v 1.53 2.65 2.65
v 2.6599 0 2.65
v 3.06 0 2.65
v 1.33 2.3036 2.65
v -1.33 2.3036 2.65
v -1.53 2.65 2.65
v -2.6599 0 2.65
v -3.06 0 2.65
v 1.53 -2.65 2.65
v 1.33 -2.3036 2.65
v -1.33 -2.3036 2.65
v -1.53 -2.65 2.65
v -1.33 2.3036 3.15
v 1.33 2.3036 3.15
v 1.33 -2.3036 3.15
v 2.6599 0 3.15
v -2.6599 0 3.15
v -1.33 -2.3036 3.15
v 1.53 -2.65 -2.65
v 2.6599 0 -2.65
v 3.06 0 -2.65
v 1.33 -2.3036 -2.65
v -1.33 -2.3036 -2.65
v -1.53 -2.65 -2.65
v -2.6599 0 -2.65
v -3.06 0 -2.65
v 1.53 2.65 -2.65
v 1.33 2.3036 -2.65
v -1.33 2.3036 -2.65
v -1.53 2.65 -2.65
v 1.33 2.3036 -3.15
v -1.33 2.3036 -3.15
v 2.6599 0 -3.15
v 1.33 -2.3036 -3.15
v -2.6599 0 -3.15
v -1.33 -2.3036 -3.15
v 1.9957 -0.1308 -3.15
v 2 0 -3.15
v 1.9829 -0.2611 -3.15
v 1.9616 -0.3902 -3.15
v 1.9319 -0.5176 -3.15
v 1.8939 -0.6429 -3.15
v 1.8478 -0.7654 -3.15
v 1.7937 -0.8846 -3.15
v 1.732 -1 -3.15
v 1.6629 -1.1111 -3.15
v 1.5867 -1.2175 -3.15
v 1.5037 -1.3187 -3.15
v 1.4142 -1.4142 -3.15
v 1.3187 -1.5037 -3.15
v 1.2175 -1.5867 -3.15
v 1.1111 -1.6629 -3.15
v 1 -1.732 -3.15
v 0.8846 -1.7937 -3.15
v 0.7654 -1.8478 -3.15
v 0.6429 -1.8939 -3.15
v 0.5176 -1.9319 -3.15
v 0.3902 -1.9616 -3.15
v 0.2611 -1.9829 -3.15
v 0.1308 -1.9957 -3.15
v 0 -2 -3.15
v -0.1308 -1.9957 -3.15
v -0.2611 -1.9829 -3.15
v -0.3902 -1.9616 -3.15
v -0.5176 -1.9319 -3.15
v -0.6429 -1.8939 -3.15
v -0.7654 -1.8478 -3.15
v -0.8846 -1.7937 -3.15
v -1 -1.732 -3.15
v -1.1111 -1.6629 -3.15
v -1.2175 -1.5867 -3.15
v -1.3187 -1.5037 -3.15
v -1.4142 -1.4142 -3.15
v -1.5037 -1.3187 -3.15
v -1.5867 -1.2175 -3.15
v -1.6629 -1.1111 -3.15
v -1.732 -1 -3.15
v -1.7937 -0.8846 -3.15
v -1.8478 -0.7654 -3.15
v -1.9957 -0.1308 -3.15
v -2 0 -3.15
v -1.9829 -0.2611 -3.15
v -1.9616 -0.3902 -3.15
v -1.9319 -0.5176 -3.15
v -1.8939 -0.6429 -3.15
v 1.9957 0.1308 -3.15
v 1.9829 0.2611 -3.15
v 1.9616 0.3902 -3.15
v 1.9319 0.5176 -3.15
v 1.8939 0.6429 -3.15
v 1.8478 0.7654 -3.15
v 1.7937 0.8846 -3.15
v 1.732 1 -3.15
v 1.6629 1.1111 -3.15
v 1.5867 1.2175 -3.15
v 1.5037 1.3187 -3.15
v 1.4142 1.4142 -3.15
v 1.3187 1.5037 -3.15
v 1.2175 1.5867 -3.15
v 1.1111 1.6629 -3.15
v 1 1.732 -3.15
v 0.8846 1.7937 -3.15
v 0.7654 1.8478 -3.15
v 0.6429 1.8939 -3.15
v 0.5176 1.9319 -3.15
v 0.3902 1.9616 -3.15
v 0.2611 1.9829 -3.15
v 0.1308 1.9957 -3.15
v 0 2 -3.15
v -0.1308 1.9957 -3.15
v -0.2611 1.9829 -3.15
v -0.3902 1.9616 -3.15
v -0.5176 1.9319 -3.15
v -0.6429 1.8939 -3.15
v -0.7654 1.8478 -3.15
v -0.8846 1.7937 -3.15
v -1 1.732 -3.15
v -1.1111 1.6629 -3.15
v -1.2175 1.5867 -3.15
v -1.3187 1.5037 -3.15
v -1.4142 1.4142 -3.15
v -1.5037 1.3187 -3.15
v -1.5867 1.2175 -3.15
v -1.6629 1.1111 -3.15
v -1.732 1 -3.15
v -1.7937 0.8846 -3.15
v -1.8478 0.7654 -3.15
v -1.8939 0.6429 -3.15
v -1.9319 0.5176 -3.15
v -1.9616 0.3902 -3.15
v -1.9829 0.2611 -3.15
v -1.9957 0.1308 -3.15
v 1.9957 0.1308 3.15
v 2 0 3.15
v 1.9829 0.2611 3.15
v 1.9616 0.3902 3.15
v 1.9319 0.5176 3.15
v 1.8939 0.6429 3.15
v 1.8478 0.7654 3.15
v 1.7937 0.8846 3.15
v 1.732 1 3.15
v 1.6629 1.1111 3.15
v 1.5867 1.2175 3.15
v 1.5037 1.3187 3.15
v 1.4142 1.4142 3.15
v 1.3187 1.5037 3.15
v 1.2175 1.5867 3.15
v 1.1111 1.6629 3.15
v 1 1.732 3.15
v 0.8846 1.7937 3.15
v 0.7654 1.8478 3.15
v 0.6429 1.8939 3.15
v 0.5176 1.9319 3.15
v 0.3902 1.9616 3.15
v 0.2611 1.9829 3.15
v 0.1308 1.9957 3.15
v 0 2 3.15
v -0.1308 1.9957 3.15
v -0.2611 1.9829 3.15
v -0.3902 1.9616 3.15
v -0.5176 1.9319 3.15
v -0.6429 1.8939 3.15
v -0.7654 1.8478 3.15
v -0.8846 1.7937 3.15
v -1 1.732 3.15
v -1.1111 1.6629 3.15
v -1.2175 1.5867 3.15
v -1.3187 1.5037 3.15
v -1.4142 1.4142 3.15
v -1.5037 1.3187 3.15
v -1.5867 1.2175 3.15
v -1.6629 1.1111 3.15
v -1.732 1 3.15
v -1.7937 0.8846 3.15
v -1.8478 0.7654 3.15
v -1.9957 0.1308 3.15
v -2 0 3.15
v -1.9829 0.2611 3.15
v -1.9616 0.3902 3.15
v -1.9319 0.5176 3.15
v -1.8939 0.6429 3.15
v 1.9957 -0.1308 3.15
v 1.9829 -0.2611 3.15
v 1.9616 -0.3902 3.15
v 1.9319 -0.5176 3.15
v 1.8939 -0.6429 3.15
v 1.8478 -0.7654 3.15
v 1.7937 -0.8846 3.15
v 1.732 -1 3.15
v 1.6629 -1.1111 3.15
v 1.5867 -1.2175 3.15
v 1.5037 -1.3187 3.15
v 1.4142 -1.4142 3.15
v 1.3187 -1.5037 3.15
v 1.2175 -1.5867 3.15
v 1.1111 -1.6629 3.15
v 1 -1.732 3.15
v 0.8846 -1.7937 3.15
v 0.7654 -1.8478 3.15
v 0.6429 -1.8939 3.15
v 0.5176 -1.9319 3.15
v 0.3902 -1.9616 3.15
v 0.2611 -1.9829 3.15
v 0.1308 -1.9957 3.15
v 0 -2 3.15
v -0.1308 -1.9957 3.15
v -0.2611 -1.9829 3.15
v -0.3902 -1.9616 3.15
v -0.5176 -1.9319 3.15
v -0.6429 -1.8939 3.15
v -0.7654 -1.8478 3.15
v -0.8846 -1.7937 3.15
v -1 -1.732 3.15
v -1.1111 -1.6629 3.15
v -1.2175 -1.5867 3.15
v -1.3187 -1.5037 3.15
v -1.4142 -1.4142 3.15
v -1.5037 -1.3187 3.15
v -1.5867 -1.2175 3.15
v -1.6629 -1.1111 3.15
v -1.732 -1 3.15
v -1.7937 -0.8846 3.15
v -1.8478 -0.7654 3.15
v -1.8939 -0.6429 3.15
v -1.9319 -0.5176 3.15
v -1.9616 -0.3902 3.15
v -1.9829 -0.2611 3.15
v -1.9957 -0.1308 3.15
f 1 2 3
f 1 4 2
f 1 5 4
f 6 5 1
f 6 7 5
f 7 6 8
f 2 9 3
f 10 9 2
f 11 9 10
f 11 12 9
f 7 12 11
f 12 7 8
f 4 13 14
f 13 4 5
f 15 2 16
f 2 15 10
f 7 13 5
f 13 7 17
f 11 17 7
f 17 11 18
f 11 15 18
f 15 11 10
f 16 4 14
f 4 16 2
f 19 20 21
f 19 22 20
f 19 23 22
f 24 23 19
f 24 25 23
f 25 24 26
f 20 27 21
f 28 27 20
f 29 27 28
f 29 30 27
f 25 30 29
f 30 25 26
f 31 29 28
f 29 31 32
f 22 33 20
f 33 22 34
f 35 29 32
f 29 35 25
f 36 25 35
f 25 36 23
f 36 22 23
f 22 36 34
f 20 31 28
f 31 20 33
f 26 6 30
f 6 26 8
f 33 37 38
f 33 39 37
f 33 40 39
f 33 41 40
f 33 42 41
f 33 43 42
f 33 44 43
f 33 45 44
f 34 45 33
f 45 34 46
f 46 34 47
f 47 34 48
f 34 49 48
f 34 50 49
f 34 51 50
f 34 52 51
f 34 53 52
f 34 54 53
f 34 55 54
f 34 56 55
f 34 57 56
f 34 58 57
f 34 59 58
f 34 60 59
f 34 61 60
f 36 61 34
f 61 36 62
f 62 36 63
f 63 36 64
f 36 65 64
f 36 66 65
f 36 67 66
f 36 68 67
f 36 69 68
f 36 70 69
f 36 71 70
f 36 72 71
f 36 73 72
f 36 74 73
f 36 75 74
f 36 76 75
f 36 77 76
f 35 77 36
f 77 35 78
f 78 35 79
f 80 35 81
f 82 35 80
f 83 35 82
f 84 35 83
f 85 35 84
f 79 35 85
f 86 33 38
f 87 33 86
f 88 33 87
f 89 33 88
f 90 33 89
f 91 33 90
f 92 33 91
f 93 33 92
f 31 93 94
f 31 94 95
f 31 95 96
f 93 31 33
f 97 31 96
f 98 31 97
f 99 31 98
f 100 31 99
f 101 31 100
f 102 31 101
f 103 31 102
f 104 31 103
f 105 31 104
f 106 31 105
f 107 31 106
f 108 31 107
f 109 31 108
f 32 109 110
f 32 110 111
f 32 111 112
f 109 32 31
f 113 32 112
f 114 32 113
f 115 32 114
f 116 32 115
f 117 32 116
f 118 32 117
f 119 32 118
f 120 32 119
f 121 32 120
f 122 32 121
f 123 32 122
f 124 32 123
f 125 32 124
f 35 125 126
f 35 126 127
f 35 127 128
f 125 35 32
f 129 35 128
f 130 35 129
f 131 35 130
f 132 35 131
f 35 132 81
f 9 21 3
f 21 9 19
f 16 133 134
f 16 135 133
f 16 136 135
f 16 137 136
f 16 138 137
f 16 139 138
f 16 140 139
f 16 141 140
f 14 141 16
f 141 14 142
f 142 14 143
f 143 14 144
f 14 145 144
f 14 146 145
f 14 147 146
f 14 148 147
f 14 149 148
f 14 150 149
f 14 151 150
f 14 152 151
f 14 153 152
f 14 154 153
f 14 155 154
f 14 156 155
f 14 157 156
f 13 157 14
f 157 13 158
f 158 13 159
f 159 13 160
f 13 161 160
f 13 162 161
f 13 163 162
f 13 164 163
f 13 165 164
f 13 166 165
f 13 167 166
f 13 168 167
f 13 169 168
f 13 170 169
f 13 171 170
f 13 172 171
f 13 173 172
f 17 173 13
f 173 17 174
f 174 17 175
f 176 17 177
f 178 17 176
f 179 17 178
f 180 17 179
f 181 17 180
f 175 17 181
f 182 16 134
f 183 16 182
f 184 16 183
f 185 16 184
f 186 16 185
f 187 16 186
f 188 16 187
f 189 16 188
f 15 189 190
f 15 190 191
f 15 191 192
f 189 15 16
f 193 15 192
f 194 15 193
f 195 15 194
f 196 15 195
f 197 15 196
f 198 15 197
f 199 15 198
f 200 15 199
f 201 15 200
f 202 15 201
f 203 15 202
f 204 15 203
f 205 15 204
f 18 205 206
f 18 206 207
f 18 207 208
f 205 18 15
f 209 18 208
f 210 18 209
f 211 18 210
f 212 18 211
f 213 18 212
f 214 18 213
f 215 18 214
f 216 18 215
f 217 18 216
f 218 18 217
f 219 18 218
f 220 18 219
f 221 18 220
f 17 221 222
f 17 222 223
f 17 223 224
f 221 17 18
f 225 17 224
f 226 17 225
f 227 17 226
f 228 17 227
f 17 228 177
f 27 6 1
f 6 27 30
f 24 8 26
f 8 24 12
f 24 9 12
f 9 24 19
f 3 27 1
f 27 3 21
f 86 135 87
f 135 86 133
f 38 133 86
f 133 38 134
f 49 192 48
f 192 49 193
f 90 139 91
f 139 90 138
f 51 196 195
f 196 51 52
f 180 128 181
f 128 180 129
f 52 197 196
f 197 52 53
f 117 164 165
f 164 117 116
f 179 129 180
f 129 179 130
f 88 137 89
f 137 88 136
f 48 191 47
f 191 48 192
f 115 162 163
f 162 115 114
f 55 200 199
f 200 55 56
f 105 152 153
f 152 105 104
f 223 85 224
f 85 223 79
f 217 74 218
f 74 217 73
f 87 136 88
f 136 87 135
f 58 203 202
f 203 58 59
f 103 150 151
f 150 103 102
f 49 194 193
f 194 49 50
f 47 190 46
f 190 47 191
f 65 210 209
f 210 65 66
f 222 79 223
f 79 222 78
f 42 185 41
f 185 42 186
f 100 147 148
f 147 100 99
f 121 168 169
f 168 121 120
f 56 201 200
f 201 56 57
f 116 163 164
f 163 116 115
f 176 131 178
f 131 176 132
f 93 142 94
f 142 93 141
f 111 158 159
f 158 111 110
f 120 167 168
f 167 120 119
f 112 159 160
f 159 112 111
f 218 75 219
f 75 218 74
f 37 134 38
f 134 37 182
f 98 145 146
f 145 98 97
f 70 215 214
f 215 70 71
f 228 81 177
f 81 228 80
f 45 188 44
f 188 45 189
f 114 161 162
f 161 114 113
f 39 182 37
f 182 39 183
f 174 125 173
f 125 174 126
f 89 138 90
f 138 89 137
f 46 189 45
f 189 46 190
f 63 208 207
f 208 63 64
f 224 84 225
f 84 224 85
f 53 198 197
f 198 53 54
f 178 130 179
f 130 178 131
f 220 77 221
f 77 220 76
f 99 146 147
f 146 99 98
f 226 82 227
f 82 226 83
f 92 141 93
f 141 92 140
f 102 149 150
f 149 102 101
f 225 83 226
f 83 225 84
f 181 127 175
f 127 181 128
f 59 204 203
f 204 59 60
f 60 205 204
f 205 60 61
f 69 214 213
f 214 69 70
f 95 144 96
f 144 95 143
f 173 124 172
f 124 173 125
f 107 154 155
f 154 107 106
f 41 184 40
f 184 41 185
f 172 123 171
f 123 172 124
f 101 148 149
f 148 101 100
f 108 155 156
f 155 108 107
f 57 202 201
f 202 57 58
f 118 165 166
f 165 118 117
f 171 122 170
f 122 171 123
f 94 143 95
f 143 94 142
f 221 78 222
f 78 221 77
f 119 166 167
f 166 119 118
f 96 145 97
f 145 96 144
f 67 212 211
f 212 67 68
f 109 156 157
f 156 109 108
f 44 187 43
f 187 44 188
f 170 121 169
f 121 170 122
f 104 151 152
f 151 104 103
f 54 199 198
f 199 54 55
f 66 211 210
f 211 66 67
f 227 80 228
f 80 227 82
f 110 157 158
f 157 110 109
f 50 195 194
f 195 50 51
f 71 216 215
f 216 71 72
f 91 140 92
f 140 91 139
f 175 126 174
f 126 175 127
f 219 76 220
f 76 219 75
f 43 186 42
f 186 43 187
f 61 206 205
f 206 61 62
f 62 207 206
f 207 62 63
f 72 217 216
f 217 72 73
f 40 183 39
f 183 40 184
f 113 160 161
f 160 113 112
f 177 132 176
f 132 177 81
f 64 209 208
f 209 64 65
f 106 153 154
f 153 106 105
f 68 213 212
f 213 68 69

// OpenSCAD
// Hex nut: 4.0mm screw, 5.3mm across flats, 6.3mm thick

$fn = 96;

// Critical dimensions
nut_af   = 5.3;   // across flats (mm)
nut_thk  = 6.3;   // thickness (mm)
hole_d   = 4.0;   // through-hole diameter for 4.0mm screw (mm)

// Edge chamfer (simple 45° bevel approximation)
chamfer_h = 0.4;  // chamfer height (mm)

// Robust boolean overlap
overlap = 0.2;

// Derived geometry
hex_R = nut_af / sqrt(3);                 // circumradius for given across-flats
chamfer_R = max(0, hex_R - chamfer_h);    // smaller hex for chamfer cut

module hex_prism(R, h) {
    linear_extrude(height=h, center=true)
        polygon(points=[
            [ R, 0],
            [ R/2,  R*sqrt(3)/2],
            [-R/2,  R*sqrt(3)/2],
            [-R, 0],
            [-R/2, -R*sqrt(3)/2],
            [ R/2, -R*sqrt(3)/2]
        ]);
}

module nut() {
    difference() {
        // Outer body
        hex_prism(hex_R, nut_thk);

        // Through hole (guaranteed to cut through)
        cylinder(d=hole_d, h=nut_thk + 2*overlap, center=true);

        // Top chamfer cut (removes a ring near the top face)
        translate([0, 0,  nut_thk/2 - chamfer_h/2])
            difference() {
                hex_prism(hex_R + overlap, chamfer_h + overlap);
                hex_prism(chamfer_R,       chamfer_h + 2*overlap);
            }

        // Bottom chamfer cut
        translate([0, 0, -nut_thk/2 + chamfer_h/2])
            difference() {
                hex_prism(hex_R + overlap, chamfer_h + overlap);
                hex_prism(chamfer_R,       chamfer_h + 2*overlap);
            }
    }
}

color("Silver") nut();
